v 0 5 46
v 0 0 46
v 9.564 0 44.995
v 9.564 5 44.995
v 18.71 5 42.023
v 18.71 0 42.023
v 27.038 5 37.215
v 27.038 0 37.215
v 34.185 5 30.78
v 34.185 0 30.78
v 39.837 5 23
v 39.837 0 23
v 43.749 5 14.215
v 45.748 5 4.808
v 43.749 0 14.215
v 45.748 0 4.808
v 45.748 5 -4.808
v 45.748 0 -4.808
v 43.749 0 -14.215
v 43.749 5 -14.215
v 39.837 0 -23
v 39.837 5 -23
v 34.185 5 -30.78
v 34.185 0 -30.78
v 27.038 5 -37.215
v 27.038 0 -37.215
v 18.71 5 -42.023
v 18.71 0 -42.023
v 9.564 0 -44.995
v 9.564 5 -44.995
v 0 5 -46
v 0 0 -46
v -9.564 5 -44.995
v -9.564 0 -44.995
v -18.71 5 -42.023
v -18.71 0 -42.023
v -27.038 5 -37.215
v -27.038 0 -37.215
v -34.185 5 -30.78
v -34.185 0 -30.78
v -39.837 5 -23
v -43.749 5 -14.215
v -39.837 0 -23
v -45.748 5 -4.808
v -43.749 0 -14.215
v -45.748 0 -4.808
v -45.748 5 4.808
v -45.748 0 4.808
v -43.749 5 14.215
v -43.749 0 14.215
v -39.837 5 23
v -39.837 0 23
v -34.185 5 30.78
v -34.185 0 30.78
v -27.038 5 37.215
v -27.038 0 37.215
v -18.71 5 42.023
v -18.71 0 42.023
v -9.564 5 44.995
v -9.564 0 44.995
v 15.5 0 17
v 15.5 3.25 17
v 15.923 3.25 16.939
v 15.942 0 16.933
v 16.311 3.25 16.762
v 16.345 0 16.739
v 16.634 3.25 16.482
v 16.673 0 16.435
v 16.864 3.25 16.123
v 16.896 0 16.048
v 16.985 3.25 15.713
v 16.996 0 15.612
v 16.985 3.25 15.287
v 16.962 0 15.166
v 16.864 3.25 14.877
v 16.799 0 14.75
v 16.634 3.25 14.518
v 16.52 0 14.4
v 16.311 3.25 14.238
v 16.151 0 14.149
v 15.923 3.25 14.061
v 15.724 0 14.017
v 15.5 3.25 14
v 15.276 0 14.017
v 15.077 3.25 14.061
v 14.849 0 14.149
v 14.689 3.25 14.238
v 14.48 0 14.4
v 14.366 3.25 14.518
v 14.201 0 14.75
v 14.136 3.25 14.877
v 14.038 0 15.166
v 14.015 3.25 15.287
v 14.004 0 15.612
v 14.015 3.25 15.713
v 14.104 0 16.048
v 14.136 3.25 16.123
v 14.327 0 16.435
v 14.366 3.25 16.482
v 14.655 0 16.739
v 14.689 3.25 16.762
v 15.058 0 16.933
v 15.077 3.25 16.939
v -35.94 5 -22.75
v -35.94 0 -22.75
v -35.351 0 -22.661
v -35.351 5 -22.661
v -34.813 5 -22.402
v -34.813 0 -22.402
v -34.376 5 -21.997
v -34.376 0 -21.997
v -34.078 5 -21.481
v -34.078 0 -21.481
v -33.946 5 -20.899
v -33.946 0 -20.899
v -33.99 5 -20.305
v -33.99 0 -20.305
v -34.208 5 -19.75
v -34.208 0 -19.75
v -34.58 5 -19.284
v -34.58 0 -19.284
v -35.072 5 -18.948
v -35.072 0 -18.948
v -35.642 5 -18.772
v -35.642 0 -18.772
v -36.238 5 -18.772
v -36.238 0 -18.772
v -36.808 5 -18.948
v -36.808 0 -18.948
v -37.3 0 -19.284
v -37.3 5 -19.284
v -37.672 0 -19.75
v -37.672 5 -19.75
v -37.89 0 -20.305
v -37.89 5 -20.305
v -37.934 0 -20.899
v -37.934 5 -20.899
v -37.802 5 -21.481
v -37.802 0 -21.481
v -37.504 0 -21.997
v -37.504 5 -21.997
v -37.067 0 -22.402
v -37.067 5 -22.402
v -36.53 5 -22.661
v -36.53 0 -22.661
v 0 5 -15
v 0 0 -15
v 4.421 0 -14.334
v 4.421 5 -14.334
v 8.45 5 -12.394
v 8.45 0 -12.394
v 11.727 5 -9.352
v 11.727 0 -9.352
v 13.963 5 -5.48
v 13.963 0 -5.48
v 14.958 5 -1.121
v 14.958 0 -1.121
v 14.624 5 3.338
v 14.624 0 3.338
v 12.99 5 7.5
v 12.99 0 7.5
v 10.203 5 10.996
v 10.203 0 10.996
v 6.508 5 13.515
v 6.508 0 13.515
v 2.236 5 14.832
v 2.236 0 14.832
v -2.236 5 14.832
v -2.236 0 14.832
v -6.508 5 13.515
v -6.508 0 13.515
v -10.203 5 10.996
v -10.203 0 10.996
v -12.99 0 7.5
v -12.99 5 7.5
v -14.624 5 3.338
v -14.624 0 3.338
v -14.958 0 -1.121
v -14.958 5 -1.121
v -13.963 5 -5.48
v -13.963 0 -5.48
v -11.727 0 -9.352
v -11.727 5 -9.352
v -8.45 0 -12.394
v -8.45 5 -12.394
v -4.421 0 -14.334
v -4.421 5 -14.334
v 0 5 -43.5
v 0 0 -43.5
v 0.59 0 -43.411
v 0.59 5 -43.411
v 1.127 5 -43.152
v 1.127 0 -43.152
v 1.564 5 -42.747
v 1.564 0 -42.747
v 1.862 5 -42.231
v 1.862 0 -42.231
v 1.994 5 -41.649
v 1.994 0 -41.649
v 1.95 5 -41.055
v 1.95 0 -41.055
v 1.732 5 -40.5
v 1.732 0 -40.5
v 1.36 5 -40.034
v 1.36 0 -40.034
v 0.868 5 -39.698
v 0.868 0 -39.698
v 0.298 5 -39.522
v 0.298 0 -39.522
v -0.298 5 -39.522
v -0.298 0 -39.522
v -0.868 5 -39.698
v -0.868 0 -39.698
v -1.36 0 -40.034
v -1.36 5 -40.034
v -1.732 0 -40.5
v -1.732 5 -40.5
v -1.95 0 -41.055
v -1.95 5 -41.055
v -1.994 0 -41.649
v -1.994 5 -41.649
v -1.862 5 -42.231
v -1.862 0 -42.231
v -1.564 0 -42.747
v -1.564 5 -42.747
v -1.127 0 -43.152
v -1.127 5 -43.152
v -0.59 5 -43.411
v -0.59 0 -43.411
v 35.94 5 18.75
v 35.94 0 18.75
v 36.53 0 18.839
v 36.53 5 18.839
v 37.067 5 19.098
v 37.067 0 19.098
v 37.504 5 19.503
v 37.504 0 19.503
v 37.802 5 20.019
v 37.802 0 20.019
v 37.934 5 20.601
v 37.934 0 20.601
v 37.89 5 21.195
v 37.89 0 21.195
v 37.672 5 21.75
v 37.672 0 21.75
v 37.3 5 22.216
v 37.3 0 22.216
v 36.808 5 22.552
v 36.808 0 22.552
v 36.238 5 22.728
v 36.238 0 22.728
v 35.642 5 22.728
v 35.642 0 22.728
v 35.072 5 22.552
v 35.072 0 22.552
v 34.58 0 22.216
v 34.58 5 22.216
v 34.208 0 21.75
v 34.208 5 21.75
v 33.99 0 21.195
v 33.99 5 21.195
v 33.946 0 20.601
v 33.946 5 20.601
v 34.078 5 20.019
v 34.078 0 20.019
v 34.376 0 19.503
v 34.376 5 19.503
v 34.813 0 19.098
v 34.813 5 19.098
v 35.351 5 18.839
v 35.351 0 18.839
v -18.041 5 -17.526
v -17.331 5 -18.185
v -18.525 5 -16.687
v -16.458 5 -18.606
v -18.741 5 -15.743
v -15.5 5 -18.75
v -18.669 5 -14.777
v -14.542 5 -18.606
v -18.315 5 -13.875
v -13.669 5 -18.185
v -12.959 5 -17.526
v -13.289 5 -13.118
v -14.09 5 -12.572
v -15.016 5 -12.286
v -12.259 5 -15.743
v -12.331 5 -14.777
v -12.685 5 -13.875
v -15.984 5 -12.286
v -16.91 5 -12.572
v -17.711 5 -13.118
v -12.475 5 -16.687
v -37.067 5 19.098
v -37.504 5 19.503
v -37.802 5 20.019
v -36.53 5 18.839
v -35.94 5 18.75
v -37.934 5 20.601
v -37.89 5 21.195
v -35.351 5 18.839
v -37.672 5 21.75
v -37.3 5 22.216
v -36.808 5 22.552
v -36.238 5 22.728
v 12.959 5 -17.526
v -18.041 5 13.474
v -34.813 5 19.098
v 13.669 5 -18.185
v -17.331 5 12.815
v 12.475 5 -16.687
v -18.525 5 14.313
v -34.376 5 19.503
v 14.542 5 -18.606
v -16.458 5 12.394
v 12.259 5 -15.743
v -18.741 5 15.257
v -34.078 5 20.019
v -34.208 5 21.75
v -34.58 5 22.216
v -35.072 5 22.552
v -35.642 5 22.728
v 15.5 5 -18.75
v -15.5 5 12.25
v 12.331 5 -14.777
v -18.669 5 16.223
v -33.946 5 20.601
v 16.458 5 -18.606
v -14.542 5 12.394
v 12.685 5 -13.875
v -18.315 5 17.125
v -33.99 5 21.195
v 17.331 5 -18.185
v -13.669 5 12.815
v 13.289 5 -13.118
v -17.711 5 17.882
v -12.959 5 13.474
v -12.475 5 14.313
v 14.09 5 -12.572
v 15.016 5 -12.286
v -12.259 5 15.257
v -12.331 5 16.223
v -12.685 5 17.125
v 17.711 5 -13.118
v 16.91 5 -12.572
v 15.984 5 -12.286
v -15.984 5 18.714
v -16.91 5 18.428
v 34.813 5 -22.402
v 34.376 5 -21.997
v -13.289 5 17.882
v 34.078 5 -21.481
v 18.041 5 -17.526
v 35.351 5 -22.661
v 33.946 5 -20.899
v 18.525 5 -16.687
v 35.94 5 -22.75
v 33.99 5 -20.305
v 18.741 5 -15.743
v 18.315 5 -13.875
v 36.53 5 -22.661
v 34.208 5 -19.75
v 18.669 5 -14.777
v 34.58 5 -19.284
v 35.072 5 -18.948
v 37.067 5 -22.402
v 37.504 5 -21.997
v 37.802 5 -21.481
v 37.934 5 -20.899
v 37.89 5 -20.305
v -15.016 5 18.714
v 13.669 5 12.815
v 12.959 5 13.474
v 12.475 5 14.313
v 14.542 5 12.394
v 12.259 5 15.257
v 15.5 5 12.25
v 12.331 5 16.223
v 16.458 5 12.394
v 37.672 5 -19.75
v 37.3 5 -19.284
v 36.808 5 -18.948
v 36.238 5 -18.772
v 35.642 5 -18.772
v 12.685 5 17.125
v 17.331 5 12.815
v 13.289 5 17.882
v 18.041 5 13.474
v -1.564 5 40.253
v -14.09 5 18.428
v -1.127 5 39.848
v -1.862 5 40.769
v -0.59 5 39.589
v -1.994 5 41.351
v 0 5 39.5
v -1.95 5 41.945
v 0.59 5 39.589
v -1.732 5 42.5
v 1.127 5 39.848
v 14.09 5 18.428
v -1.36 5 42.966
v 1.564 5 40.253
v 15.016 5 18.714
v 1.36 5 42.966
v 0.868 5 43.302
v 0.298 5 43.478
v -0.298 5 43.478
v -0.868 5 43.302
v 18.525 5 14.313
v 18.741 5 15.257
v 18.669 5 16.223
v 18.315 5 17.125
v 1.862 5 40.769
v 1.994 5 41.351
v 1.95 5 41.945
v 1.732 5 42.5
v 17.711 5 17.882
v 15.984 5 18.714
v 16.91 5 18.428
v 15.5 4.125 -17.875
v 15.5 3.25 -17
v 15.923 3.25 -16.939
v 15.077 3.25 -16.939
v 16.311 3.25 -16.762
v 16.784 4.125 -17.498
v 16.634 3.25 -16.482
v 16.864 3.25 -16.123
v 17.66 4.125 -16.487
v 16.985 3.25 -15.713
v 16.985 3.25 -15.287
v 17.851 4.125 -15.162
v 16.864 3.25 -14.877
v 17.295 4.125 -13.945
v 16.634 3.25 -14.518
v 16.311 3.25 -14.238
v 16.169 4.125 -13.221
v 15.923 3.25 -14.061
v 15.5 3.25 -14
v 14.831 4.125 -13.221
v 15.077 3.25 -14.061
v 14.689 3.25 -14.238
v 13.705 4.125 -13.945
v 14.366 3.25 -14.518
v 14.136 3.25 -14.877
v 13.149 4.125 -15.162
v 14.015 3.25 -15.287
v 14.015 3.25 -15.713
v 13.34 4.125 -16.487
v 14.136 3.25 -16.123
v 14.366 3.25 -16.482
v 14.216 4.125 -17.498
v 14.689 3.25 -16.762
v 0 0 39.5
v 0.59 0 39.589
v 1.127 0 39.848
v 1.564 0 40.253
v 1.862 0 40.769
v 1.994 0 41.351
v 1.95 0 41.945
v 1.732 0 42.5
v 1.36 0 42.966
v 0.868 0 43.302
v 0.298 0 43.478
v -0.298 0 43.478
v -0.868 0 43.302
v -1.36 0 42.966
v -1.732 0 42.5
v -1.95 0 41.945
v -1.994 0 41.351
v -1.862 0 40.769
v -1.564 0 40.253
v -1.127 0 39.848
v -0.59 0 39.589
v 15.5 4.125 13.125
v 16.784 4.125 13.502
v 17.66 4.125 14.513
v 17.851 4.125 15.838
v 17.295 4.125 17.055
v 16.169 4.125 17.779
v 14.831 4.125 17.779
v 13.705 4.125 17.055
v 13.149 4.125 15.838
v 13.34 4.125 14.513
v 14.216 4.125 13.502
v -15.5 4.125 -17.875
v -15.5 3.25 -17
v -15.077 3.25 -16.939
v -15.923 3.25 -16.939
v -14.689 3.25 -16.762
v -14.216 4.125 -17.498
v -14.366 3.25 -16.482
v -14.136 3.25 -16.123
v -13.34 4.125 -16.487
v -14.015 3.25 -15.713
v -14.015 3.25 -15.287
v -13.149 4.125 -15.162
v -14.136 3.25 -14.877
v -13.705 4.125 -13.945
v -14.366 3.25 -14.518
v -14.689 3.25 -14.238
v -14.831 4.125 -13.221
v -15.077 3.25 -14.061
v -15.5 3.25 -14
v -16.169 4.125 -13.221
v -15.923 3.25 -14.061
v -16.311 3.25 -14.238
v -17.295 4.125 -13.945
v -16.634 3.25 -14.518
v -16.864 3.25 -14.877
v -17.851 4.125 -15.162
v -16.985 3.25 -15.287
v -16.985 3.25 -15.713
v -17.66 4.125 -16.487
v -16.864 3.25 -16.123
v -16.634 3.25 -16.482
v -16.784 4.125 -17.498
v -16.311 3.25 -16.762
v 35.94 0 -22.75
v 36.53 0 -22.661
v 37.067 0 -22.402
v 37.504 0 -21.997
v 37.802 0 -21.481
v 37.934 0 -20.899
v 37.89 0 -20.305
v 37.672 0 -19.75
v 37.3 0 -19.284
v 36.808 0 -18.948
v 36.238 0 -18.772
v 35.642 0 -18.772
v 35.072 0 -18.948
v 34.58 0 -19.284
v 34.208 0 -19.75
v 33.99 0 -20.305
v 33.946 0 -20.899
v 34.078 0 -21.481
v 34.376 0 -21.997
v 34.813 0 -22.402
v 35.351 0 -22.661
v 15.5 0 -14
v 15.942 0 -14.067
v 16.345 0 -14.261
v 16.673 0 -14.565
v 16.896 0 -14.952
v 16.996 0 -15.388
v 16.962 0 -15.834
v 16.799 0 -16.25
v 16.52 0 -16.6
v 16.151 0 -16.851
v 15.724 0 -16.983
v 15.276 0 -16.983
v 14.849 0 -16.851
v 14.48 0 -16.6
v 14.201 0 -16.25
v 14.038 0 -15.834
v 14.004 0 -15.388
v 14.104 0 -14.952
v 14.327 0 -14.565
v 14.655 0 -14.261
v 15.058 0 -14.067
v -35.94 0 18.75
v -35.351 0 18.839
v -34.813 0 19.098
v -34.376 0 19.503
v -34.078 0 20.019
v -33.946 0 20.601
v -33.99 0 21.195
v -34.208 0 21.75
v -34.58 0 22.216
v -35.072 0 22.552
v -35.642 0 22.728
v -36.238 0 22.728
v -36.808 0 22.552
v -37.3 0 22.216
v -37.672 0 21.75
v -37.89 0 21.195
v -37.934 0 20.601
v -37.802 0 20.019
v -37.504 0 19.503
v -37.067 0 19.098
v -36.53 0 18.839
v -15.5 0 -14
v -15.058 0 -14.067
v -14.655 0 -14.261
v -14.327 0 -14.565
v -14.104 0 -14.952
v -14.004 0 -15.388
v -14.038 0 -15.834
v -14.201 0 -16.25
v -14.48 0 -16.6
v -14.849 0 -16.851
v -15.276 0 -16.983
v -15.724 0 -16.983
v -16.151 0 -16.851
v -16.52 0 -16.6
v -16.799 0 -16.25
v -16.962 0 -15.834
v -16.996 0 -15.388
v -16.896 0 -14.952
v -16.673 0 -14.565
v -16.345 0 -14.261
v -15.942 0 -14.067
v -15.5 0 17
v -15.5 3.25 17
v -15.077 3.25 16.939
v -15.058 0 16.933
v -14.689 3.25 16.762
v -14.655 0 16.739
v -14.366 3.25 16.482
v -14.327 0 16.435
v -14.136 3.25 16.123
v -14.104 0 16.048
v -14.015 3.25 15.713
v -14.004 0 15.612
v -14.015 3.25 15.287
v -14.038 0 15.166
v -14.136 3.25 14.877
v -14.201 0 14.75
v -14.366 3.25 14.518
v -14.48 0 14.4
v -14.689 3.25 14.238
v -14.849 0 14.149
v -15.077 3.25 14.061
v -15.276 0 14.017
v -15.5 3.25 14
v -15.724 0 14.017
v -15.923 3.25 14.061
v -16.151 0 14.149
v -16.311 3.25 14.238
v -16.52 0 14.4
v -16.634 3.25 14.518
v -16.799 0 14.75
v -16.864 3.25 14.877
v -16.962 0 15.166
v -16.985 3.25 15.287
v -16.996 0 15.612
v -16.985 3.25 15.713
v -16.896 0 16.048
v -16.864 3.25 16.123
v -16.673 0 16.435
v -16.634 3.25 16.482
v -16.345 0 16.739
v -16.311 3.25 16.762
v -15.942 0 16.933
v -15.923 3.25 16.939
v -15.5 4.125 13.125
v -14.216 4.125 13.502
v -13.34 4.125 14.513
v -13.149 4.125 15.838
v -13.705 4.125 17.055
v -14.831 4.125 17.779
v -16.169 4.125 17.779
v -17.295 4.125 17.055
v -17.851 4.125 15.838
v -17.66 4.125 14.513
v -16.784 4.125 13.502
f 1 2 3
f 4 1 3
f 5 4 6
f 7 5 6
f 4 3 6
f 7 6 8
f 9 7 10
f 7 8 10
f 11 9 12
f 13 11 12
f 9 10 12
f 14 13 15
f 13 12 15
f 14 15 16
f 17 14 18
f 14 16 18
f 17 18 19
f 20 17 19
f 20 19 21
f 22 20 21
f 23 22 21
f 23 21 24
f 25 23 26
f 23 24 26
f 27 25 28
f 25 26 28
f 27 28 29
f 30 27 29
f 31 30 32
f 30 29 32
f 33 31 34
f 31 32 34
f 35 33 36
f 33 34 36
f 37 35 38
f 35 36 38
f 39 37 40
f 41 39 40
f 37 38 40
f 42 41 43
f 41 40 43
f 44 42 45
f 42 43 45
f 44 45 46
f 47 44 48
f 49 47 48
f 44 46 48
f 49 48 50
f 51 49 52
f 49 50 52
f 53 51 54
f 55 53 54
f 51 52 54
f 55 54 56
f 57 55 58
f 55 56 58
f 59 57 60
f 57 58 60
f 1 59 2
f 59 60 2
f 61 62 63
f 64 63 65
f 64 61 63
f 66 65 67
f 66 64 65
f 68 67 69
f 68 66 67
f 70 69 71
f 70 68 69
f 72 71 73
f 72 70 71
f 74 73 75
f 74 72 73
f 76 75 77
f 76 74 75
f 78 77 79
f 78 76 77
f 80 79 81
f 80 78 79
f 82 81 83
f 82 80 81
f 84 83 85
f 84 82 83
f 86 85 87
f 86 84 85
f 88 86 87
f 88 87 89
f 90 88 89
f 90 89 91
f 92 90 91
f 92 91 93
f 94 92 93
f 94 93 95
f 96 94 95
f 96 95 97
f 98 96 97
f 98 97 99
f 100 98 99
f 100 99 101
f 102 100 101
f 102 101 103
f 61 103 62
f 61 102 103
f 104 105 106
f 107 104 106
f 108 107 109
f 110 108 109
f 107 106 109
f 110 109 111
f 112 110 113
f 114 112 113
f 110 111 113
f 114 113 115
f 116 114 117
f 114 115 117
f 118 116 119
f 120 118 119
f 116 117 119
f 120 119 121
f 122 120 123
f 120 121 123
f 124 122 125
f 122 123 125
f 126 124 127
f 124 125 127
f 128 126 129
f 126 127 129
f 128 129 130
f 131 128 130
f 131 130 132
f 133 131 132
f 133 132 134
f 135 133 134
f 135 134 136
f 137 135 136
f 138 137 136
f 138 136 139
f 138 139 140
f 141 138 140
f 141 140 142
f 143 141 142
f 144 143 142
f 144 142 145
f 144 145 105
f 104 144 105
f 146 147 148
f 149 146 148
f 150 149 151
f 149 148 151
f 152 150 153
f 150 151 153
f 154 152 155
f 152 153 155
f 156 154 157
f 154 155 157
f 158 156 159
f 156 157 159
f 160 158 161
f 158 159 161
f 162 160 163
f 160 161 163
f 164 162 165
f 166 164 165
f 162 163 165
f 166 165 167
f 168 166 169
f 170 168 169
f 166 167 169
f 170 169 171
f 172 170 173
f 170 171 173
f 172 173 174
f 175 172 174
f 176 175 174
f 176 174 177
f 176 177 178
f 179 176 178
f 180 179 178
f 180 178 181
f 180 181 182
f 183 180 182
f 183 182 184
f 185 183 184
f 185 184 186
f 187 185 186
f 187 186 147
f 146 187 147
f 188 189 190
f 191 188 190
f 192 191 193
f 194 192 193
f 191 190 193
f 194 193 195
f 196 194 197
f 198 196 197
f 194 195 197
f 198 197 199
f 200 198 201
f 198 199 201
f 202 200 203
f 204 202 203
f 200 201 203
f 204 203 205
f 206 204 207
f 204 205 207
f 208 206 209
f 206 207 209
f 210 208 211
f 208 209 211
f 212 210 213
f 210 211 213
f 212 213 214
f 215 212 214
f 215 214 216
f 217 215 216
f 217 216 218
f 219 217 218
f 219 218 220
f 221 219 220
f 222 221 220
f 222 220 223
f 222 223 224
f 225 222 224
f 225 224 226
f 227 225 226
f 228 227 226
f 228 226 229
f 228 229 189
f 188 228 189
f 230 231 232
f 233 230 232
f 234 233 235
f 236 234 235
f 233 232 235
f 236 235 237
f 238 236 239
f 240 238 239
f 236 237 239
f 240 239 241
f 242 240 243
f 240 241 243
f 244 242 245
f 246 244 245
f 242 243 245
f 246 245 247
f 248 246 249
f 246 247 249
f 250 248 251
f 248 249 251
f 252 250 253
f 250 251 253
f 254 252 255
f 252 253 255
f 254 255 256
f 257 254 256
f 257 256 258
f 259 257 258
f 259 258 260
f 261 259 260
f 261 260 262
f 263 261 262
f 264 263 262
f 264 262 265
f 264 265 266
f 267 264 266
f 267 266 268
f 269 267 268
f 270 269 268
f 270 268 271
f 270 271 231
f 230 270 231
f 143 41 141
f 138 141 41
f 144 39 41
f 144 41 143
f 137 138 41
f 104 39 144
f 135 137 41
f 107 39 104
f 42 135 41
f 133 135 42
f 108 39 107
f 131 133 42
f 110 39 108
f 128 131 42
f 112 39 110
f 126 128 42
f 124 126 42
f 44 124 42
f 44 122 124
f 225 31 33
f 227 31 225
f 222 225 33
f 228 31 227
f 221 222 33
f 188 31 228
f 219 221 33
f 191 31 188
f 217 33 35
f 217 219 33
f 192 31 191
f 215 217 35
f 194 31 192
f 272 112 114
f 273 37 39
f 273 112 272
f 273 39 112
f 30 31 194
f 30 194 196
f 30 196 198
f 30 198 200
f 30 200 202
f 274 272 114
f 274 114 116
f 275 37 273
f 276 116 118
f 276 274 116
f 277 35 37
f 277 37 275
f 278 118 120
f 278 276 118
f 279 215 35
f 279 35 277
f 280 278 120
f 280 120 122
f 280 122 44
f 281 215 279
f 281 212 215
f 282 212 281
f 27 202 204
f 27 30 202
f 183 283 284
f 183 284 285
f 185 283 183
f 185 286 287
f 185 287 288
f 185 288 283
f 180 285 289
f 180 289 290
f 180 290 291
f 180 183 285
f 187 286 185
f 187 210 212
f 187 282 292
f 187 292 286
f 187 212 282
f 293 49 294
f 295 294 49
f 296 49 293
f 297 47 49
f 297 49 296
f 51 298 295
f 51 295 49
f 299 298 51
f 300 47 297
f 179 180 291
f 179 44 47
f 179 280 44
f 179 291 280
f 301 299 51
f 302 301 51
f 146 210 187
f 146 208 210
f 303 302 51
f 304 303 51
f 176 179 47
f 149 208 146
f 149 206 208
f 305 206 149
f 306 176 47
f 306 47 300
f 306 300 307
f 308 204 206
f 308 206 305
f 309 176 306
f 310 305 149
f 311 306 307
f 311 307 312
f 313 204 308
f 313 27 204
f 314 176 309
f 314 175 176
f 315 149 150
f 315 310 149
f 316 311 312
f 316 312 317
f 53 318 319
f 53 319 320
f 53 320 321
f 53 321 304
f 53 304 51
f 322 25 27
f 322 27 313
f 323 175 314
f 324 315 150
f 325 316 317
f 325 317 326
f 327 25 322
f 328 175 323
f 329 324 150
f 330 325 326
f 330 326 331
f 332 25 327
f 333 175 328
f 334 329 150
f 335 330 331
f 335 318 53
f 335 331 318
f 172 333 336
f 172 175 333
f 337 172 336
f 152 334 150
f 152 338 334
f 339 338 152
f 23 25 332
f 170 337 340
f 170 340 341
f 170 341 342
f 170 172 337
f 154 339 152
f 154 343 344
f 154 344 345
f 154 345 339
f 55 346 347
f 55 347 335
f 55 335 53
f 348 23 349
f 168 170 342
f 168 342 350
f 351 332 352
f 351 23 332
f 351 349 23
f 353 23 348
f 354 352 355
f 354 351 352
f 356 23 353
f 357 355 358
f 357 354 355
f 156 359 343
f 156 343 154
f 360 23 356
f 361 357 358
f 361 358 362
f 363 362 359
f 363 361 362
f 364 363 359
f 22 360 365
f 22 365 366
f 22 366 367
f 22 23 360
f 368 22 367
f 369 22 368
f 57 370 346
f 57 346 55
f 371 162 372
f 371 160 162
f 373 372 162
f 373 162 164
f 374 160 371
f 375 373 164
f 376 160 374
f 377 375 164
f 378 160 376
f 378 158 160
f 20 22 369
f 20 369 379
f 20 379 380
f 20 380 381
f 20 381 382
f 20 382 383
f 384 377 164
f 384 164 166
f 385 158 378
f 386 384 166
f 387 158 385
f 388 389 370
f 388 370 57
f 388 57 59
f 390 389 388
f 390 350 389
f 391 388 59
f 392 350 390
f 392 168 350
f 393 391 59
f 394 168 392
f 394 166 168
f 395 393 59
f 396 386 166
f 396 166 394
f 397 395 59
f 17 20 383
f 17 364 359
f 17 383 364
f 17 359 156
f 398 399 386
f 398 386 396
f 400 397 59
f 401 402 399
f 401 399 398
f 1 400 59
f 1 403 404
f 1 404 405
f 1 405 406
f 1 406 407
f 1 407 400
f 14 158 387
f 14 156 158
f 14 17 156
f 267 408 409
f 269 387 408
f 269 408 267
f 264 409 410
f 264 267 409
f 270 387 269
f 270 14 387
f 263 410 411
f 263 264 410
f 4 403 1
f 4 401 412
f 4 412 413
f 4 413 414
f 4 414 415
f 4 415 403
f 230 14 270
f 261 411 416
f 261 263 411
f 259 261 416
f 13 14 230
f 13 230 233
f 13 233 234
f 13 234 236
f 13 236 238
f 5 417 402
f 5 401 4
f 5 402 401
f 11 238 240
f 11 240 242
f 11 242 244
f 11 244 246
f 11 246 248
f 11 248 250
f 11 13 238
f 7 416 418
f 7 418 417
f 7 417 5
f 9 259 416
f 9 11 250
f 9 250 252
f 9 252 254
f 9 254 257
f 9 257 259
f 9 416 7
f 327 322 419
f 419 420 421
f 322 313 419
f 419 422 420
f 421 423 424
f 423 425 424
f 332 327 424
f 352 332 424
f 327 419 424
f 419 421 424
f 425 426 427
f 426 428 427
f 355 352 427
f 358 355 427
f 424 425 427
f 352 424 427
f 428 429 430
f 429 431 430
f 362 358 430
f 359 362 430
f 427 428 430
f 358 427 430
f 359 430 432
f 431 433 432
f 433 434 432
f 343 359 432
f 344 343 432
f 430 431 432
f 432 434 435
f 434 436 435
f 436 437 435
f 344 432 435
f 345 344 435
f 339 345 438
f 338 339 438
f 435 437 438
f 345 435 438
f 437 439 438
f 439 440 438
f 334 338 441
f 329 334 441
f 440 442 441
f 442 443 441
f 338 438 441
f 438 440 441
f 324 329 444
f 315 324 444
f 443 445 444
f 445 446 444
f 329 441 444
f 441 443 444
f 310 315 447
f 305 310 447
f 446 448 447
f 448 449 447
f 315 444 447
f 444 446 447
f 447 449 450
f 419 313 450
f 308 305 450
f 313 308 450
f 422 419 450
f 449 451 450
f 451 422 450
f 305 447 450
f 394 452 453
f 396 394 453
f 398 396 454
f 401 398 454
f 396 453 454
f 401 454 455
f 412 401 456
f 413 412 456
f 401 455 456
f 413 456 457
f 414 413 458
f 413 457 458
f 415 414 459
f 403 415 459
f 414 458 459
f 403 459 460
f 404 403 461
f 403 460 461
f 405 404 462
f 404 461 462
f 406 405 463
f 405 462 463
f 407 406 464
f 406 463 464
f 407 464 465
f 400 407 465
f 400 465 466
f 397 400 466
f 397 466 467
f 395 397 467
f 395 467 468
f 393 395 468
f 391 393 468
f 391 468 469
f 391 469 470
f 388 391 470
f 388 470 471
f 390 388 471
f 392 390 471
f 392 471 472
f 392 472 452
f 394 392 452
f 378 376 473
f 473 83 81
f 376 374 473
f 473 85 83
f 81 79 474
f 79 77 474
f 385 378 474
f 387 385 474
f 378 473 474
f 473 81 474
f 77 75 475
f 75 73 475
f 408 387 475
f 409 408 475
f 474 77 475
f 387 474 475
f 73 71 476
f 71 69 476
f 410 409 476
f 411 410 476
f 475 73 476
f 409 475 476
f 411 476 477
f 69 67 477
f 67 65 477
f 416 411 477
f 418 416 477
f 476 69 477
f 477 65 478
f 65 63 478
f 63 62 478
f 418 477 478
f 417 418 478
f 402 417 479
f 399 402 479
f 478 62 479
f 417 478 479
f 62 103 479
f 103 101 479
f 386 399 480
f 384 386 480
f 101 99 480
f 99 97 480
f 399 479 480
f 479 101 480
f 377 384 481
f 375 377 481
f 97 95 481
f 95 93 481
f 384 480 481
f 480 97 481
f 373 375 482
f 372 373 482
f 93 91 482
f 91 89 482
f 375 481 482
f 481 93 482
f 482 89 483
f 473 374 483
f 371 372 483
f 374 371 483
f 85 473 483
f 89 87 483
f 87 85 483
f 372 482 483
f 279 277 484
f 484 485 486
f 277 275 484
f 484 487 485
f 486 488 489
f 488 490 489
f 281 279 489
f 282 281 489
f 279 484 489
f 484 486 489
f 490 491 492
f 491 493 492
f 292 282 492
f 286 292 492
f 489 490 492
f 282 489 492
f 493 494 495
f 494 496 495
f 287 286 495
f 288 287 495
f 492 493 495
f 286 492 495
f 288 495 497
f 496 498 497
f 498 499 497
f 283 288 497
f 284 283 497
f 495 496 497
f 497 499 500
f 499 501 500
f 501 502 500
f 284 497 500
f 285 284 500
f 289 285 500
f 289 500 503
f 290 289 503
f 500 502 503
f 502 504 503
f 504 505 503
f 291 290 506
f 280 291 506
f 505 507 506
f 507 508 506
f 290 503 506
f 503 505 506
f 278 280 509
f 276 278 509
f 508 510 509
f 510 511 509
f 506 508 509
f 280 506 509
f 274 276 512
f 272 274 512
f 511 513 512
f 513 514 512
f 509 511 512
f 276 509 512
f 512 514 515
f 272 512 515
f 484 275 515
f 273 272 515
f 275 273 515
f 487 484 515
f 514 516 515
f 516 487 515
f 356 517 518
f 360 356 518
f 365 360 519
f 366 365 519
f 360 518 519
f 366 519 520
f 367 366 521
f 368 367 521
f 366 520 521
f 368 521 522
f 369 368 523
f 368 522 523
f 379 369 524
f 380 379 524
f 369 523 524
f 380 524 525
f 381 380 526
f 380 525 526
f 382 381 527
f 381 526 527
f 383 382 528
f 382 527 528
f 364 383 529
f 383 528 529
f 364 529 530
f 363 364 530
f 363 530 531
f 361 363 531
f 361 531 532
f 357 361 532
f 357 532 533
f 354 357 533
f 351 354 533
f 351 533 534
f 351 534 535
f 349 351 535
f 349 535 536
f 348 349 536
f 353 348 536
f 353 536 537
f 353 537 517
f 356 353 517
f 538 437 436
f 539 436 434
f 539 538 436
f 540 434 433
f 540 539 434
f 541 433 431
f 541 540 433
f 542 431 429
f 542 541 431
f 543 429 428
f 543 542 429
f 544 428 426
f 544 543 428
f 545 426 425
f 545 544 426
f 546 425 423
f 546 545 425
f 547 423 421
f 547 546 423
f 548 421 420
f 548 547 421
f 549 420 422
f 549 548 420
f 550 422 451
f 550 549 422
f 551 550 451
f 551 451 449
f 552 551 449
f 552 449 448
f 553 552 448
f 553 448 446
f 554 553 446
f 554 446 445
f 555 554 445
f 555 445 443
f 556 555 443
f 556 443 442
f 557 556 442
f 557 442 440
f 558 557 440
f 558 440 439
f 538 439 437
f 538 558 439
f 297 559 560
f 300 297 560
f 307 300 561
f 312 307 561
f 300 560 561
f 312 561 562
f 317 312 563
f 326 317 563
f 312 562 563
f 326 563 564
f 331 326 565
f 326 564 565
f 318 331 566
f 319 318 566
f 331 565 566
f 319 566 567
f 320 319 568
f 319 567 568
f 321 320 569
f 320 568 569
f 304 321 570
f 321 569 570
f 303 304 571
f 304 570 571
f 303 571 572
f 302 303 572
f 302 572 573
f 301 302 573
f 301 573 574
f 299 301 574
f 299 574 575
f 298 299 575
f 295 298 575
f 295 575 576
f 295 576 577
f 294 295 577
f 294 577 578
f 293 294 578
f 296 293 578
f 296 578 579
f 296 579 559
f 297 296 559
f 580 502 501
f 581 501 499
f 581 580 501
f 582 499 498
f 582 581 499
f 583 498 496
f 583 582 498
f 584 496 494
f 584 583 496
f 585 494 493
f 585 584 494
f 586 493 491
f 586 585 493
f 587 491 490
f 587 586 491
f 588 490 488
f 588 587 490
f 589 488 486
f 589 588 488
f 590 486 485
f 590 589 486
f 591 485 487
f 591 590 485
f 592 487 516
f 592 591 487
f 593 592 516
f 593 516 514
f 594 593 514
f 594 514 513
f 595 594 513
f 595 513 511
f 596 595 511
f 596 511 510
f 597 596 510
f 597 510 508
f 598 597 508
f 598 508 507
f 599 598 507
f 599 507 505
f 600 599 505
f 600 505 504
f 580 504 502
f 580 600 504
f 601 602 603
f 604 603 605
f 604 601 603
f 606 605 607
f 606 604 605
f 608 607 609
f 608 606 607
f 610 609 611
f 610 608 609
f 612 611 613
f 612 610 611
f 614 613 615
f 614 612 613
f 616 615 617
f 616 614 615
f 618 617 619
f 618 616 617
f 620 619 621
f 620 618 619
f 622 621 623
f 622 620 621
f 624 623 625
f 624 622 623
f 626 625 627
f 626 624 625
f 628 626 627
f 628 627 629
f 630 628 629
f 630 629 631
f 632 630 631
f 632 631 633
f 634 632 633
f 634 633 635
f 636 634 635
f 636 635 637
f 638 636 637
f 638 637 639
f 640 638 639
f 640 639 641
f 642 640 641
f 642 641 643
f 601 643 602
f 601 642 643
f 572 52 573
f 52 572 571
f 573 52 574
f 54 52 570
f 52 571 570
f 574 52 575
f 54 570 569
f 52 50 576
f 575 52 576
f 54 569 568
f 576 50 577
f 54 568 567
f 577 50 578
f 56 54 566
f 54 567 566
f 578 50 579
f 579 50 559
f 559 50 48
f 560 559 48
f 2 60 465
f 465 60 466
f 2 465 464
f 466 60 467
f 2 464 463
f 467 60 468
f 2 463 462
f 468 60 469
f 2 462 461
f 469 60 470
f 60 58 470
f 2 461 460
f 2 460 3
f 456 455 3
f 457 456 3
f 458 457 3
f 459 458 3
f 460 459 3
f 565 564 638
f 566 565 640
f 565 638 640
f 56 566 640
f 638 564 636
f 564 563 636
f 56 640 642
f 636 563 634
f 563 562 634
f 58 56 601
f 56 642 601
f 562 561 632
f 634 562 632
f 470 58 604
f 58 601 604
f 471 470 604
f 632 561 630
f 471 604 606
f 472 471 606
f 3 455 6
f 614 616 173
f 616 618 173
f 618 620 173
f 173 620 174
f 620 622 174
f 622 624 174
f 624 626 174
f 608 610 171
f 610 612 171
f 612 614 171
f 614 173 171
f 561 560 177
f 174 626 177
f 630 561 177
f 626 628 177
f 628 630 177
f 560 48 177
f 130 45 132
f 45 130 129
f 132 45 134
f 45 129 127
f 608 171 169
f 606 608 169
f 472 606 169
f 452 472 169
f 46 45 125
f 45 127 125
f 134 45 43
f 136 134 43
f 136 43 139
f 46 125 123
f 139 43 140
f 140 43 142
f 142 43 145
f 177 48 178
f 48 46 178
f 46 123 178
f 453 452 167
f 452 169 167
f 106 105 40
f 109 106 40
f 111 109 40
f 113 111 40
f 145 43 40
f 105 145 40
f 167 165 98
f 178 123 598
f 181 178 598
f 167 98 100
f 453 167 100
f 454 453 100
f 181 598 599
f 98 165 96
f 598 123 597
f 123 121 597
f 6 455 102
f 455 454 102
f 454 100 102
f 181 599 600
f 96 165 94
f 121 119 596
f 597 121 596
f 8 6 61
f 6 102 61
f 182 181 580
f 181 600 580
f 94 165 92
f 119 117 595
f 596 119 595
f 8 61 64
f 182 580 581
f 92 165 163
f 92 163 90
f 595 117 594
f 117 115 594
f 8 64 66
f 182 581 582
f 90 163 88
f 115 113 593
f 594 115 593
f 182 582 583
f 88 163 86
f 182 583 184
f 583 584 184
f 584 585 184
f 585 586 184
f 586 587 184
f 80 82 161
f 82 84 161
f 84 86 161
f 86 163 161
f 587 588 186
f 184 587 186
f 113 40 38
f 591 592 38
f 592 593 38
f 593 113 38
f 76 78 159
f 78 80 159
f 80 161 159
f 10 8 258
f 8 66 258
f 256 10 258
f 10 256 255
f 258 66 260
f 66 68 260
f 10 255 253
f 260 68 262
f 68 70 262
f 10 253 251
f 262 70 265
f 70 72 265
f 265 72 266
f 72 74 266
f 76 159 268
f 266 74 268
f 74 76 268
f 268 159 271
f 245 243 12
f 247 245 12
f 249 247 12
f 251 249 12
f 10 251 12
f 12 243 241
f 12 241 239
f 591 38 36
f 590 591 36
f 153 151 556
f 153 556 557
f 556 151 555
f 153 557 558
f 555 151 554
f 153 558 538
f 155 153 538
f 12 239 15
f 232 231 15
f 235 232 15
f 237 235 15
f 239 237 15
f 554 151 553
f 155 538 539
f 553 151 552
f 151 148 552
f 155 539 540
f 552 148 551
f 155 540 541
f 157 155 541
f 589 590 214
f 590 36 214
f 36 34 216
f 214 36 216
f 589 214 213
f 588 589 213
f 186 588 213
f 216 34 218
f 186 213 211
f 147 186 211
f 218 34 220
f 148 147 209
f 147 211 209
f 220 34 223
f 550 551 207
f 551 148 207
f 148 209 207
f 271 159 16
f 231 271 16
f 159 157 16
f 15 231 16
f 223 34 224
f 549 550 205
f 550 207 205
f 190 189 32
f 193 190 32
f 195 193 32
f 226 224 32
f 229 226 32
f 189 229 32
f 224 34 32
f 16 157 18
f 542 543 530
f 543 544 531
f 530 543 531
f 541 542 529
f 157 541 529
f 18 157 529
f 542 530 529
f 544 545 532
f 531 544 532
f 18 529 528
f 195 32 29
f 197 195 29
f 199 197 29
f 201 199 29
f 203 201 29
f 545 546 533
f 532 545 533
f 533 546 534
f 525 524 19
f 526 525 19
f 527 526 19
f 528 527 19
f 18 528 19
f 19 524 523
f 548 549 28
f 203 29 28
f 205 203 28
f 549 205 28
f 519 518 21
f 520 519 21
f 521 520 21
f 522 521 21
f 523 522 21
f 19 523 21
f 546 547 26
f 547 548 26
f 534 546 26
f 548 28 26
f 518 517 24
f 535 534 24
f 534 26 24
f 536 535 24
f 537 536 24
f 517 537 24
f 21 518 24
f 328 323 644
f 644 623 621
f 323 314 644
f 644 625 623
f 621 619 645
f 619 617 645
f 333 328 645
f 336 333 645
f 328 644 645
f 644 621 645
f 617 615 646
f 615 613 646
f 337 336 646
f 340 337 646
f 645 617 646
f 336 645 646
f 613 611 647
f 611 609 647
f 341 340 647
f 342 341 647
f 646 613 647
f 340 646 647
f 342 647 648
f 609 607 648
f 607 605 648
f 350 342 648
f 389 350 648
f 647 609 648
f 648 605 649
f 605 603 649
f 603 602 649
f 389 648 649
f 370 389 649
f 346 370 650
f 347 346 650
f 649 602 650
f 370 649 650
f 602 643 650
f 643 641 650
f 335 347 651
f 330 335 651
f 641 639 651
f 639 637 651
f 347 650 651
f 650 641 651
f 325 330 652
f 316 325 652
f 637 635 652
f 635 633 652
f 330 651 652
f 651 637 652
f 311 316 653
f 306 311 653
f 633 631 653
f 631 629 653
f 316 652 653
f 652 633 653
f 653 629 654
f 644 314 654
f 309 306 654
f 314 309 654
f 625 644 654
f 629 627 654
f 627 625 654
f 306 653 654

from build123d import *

# Parameters (mm, degrees)
SKETCH1_R                                            = 46
SKETCH1_R_2                                          = 1.5
BOSS_EXTRUDE1_DEPTH                                  = 5
SKETCH3_R                                            = 2
CUT_EXTRUDE2_DEPTH                                   = 66.245689513
SKETCH7_R                                            = 15
CUT_EXTRUDE3_DEPTH                                   = 66.245689513
CSK_FOR_M3_SOCKET_COUNTERSUNK_HEAD_SCREW_D           = 2.8
CSK_FOR_M3_SOCKET_COUNTERSUNK_HEAD_SCREW_CSINK_D     = 6.5
CSK_FOR_M3_SOCKET_COUNTERSUNK_HEAD_SCREW_CSINK_ANGLE = 90


with BuildPart() as part:
    # Sketch1 → Boss-Extrude1 (new body)
    with BuildSketch(Plane(origin=(0, 0, 0), x_dir=(1, 0, 0), z_dir=(0, 1, 0))):
        Circle(SKETCH1_R)
        with Locations((-15.5, -15.5)):
            Circle(SKETCH1_R_2, mode=Mode.SUBTRACT)
        with Locations((15.5, -15.5)):
            Circle(SKETCH1_R_2, mode=Mode.SUBTRACT)
        with Locations((-15.5, 15.5)):
            Circle(SKETCH1_R_2, mode=Mode.SUBTRACT)
        with Locations((15.5, 15.5)):
            Circle(SKETCH1_R_2, mode=Mode.SUBTRACT)
    extrude(amount=BOSS_EXTRUDE1_DEPTH)

    # Sketch3 → Cut-Extrude2 (cut, through all)
    with BuildSketch(Plane.XZ):
        with Locations((0, 41.5)):
            Circle(SKETCH3_R)
        with Locations((35.940054257, 20.75)):
            Circle(SKETCH3_R)
        with Locations((35.940054257, -20.75)):
            Circle(SKETCH3_R)
        with Locations((0, -41.5)):
            Circle(SKETCH3_R)
        with Locations((-35.940054257, -20.75)):
            Circle(SKETCH3_R)
        with Locations((-35.940054257, 20.75)):
            Circle(SKETCH3_R)
    extrude(amount=-CUT_EXTRUDE2_DEPTH, mode=Mode.SUBTRACT)

    # Sketch7 → Cut-Extrude3 (cut, through all)
    with BuildSketch(Plane.XZ):
        Circle(SKETCH7_R)
    extrude(amount=-CUT_EXTRUDE3_DEPTH, mode=Mode.SUBTRACT)

    # CSK for M3 socket countersunk head screw1 (through all)
    with Locations(Plane(origin=(15.5, 5, -15.5), x_dir=(0, 0, 1), z_dir=(0, 1, 0))):
        with Locations((0, 0), (31, 0), (31, -31), (0, -31)):
            CounterSinkHole(CSK_FOR_M3_SOCKET_COUNTERSUNK_HEAD_SCREW_D / 2, CSK_FOR_M3_SOCKET_COUNTERSUNK_HEAD_SCREW_CSINK_D / 2, counter_sink_angle=CSK_FOR_M3_SOCKET_COUNTERSUNK_HEAD_SCREW_CSINK_ANGLE)


solid = part.part
